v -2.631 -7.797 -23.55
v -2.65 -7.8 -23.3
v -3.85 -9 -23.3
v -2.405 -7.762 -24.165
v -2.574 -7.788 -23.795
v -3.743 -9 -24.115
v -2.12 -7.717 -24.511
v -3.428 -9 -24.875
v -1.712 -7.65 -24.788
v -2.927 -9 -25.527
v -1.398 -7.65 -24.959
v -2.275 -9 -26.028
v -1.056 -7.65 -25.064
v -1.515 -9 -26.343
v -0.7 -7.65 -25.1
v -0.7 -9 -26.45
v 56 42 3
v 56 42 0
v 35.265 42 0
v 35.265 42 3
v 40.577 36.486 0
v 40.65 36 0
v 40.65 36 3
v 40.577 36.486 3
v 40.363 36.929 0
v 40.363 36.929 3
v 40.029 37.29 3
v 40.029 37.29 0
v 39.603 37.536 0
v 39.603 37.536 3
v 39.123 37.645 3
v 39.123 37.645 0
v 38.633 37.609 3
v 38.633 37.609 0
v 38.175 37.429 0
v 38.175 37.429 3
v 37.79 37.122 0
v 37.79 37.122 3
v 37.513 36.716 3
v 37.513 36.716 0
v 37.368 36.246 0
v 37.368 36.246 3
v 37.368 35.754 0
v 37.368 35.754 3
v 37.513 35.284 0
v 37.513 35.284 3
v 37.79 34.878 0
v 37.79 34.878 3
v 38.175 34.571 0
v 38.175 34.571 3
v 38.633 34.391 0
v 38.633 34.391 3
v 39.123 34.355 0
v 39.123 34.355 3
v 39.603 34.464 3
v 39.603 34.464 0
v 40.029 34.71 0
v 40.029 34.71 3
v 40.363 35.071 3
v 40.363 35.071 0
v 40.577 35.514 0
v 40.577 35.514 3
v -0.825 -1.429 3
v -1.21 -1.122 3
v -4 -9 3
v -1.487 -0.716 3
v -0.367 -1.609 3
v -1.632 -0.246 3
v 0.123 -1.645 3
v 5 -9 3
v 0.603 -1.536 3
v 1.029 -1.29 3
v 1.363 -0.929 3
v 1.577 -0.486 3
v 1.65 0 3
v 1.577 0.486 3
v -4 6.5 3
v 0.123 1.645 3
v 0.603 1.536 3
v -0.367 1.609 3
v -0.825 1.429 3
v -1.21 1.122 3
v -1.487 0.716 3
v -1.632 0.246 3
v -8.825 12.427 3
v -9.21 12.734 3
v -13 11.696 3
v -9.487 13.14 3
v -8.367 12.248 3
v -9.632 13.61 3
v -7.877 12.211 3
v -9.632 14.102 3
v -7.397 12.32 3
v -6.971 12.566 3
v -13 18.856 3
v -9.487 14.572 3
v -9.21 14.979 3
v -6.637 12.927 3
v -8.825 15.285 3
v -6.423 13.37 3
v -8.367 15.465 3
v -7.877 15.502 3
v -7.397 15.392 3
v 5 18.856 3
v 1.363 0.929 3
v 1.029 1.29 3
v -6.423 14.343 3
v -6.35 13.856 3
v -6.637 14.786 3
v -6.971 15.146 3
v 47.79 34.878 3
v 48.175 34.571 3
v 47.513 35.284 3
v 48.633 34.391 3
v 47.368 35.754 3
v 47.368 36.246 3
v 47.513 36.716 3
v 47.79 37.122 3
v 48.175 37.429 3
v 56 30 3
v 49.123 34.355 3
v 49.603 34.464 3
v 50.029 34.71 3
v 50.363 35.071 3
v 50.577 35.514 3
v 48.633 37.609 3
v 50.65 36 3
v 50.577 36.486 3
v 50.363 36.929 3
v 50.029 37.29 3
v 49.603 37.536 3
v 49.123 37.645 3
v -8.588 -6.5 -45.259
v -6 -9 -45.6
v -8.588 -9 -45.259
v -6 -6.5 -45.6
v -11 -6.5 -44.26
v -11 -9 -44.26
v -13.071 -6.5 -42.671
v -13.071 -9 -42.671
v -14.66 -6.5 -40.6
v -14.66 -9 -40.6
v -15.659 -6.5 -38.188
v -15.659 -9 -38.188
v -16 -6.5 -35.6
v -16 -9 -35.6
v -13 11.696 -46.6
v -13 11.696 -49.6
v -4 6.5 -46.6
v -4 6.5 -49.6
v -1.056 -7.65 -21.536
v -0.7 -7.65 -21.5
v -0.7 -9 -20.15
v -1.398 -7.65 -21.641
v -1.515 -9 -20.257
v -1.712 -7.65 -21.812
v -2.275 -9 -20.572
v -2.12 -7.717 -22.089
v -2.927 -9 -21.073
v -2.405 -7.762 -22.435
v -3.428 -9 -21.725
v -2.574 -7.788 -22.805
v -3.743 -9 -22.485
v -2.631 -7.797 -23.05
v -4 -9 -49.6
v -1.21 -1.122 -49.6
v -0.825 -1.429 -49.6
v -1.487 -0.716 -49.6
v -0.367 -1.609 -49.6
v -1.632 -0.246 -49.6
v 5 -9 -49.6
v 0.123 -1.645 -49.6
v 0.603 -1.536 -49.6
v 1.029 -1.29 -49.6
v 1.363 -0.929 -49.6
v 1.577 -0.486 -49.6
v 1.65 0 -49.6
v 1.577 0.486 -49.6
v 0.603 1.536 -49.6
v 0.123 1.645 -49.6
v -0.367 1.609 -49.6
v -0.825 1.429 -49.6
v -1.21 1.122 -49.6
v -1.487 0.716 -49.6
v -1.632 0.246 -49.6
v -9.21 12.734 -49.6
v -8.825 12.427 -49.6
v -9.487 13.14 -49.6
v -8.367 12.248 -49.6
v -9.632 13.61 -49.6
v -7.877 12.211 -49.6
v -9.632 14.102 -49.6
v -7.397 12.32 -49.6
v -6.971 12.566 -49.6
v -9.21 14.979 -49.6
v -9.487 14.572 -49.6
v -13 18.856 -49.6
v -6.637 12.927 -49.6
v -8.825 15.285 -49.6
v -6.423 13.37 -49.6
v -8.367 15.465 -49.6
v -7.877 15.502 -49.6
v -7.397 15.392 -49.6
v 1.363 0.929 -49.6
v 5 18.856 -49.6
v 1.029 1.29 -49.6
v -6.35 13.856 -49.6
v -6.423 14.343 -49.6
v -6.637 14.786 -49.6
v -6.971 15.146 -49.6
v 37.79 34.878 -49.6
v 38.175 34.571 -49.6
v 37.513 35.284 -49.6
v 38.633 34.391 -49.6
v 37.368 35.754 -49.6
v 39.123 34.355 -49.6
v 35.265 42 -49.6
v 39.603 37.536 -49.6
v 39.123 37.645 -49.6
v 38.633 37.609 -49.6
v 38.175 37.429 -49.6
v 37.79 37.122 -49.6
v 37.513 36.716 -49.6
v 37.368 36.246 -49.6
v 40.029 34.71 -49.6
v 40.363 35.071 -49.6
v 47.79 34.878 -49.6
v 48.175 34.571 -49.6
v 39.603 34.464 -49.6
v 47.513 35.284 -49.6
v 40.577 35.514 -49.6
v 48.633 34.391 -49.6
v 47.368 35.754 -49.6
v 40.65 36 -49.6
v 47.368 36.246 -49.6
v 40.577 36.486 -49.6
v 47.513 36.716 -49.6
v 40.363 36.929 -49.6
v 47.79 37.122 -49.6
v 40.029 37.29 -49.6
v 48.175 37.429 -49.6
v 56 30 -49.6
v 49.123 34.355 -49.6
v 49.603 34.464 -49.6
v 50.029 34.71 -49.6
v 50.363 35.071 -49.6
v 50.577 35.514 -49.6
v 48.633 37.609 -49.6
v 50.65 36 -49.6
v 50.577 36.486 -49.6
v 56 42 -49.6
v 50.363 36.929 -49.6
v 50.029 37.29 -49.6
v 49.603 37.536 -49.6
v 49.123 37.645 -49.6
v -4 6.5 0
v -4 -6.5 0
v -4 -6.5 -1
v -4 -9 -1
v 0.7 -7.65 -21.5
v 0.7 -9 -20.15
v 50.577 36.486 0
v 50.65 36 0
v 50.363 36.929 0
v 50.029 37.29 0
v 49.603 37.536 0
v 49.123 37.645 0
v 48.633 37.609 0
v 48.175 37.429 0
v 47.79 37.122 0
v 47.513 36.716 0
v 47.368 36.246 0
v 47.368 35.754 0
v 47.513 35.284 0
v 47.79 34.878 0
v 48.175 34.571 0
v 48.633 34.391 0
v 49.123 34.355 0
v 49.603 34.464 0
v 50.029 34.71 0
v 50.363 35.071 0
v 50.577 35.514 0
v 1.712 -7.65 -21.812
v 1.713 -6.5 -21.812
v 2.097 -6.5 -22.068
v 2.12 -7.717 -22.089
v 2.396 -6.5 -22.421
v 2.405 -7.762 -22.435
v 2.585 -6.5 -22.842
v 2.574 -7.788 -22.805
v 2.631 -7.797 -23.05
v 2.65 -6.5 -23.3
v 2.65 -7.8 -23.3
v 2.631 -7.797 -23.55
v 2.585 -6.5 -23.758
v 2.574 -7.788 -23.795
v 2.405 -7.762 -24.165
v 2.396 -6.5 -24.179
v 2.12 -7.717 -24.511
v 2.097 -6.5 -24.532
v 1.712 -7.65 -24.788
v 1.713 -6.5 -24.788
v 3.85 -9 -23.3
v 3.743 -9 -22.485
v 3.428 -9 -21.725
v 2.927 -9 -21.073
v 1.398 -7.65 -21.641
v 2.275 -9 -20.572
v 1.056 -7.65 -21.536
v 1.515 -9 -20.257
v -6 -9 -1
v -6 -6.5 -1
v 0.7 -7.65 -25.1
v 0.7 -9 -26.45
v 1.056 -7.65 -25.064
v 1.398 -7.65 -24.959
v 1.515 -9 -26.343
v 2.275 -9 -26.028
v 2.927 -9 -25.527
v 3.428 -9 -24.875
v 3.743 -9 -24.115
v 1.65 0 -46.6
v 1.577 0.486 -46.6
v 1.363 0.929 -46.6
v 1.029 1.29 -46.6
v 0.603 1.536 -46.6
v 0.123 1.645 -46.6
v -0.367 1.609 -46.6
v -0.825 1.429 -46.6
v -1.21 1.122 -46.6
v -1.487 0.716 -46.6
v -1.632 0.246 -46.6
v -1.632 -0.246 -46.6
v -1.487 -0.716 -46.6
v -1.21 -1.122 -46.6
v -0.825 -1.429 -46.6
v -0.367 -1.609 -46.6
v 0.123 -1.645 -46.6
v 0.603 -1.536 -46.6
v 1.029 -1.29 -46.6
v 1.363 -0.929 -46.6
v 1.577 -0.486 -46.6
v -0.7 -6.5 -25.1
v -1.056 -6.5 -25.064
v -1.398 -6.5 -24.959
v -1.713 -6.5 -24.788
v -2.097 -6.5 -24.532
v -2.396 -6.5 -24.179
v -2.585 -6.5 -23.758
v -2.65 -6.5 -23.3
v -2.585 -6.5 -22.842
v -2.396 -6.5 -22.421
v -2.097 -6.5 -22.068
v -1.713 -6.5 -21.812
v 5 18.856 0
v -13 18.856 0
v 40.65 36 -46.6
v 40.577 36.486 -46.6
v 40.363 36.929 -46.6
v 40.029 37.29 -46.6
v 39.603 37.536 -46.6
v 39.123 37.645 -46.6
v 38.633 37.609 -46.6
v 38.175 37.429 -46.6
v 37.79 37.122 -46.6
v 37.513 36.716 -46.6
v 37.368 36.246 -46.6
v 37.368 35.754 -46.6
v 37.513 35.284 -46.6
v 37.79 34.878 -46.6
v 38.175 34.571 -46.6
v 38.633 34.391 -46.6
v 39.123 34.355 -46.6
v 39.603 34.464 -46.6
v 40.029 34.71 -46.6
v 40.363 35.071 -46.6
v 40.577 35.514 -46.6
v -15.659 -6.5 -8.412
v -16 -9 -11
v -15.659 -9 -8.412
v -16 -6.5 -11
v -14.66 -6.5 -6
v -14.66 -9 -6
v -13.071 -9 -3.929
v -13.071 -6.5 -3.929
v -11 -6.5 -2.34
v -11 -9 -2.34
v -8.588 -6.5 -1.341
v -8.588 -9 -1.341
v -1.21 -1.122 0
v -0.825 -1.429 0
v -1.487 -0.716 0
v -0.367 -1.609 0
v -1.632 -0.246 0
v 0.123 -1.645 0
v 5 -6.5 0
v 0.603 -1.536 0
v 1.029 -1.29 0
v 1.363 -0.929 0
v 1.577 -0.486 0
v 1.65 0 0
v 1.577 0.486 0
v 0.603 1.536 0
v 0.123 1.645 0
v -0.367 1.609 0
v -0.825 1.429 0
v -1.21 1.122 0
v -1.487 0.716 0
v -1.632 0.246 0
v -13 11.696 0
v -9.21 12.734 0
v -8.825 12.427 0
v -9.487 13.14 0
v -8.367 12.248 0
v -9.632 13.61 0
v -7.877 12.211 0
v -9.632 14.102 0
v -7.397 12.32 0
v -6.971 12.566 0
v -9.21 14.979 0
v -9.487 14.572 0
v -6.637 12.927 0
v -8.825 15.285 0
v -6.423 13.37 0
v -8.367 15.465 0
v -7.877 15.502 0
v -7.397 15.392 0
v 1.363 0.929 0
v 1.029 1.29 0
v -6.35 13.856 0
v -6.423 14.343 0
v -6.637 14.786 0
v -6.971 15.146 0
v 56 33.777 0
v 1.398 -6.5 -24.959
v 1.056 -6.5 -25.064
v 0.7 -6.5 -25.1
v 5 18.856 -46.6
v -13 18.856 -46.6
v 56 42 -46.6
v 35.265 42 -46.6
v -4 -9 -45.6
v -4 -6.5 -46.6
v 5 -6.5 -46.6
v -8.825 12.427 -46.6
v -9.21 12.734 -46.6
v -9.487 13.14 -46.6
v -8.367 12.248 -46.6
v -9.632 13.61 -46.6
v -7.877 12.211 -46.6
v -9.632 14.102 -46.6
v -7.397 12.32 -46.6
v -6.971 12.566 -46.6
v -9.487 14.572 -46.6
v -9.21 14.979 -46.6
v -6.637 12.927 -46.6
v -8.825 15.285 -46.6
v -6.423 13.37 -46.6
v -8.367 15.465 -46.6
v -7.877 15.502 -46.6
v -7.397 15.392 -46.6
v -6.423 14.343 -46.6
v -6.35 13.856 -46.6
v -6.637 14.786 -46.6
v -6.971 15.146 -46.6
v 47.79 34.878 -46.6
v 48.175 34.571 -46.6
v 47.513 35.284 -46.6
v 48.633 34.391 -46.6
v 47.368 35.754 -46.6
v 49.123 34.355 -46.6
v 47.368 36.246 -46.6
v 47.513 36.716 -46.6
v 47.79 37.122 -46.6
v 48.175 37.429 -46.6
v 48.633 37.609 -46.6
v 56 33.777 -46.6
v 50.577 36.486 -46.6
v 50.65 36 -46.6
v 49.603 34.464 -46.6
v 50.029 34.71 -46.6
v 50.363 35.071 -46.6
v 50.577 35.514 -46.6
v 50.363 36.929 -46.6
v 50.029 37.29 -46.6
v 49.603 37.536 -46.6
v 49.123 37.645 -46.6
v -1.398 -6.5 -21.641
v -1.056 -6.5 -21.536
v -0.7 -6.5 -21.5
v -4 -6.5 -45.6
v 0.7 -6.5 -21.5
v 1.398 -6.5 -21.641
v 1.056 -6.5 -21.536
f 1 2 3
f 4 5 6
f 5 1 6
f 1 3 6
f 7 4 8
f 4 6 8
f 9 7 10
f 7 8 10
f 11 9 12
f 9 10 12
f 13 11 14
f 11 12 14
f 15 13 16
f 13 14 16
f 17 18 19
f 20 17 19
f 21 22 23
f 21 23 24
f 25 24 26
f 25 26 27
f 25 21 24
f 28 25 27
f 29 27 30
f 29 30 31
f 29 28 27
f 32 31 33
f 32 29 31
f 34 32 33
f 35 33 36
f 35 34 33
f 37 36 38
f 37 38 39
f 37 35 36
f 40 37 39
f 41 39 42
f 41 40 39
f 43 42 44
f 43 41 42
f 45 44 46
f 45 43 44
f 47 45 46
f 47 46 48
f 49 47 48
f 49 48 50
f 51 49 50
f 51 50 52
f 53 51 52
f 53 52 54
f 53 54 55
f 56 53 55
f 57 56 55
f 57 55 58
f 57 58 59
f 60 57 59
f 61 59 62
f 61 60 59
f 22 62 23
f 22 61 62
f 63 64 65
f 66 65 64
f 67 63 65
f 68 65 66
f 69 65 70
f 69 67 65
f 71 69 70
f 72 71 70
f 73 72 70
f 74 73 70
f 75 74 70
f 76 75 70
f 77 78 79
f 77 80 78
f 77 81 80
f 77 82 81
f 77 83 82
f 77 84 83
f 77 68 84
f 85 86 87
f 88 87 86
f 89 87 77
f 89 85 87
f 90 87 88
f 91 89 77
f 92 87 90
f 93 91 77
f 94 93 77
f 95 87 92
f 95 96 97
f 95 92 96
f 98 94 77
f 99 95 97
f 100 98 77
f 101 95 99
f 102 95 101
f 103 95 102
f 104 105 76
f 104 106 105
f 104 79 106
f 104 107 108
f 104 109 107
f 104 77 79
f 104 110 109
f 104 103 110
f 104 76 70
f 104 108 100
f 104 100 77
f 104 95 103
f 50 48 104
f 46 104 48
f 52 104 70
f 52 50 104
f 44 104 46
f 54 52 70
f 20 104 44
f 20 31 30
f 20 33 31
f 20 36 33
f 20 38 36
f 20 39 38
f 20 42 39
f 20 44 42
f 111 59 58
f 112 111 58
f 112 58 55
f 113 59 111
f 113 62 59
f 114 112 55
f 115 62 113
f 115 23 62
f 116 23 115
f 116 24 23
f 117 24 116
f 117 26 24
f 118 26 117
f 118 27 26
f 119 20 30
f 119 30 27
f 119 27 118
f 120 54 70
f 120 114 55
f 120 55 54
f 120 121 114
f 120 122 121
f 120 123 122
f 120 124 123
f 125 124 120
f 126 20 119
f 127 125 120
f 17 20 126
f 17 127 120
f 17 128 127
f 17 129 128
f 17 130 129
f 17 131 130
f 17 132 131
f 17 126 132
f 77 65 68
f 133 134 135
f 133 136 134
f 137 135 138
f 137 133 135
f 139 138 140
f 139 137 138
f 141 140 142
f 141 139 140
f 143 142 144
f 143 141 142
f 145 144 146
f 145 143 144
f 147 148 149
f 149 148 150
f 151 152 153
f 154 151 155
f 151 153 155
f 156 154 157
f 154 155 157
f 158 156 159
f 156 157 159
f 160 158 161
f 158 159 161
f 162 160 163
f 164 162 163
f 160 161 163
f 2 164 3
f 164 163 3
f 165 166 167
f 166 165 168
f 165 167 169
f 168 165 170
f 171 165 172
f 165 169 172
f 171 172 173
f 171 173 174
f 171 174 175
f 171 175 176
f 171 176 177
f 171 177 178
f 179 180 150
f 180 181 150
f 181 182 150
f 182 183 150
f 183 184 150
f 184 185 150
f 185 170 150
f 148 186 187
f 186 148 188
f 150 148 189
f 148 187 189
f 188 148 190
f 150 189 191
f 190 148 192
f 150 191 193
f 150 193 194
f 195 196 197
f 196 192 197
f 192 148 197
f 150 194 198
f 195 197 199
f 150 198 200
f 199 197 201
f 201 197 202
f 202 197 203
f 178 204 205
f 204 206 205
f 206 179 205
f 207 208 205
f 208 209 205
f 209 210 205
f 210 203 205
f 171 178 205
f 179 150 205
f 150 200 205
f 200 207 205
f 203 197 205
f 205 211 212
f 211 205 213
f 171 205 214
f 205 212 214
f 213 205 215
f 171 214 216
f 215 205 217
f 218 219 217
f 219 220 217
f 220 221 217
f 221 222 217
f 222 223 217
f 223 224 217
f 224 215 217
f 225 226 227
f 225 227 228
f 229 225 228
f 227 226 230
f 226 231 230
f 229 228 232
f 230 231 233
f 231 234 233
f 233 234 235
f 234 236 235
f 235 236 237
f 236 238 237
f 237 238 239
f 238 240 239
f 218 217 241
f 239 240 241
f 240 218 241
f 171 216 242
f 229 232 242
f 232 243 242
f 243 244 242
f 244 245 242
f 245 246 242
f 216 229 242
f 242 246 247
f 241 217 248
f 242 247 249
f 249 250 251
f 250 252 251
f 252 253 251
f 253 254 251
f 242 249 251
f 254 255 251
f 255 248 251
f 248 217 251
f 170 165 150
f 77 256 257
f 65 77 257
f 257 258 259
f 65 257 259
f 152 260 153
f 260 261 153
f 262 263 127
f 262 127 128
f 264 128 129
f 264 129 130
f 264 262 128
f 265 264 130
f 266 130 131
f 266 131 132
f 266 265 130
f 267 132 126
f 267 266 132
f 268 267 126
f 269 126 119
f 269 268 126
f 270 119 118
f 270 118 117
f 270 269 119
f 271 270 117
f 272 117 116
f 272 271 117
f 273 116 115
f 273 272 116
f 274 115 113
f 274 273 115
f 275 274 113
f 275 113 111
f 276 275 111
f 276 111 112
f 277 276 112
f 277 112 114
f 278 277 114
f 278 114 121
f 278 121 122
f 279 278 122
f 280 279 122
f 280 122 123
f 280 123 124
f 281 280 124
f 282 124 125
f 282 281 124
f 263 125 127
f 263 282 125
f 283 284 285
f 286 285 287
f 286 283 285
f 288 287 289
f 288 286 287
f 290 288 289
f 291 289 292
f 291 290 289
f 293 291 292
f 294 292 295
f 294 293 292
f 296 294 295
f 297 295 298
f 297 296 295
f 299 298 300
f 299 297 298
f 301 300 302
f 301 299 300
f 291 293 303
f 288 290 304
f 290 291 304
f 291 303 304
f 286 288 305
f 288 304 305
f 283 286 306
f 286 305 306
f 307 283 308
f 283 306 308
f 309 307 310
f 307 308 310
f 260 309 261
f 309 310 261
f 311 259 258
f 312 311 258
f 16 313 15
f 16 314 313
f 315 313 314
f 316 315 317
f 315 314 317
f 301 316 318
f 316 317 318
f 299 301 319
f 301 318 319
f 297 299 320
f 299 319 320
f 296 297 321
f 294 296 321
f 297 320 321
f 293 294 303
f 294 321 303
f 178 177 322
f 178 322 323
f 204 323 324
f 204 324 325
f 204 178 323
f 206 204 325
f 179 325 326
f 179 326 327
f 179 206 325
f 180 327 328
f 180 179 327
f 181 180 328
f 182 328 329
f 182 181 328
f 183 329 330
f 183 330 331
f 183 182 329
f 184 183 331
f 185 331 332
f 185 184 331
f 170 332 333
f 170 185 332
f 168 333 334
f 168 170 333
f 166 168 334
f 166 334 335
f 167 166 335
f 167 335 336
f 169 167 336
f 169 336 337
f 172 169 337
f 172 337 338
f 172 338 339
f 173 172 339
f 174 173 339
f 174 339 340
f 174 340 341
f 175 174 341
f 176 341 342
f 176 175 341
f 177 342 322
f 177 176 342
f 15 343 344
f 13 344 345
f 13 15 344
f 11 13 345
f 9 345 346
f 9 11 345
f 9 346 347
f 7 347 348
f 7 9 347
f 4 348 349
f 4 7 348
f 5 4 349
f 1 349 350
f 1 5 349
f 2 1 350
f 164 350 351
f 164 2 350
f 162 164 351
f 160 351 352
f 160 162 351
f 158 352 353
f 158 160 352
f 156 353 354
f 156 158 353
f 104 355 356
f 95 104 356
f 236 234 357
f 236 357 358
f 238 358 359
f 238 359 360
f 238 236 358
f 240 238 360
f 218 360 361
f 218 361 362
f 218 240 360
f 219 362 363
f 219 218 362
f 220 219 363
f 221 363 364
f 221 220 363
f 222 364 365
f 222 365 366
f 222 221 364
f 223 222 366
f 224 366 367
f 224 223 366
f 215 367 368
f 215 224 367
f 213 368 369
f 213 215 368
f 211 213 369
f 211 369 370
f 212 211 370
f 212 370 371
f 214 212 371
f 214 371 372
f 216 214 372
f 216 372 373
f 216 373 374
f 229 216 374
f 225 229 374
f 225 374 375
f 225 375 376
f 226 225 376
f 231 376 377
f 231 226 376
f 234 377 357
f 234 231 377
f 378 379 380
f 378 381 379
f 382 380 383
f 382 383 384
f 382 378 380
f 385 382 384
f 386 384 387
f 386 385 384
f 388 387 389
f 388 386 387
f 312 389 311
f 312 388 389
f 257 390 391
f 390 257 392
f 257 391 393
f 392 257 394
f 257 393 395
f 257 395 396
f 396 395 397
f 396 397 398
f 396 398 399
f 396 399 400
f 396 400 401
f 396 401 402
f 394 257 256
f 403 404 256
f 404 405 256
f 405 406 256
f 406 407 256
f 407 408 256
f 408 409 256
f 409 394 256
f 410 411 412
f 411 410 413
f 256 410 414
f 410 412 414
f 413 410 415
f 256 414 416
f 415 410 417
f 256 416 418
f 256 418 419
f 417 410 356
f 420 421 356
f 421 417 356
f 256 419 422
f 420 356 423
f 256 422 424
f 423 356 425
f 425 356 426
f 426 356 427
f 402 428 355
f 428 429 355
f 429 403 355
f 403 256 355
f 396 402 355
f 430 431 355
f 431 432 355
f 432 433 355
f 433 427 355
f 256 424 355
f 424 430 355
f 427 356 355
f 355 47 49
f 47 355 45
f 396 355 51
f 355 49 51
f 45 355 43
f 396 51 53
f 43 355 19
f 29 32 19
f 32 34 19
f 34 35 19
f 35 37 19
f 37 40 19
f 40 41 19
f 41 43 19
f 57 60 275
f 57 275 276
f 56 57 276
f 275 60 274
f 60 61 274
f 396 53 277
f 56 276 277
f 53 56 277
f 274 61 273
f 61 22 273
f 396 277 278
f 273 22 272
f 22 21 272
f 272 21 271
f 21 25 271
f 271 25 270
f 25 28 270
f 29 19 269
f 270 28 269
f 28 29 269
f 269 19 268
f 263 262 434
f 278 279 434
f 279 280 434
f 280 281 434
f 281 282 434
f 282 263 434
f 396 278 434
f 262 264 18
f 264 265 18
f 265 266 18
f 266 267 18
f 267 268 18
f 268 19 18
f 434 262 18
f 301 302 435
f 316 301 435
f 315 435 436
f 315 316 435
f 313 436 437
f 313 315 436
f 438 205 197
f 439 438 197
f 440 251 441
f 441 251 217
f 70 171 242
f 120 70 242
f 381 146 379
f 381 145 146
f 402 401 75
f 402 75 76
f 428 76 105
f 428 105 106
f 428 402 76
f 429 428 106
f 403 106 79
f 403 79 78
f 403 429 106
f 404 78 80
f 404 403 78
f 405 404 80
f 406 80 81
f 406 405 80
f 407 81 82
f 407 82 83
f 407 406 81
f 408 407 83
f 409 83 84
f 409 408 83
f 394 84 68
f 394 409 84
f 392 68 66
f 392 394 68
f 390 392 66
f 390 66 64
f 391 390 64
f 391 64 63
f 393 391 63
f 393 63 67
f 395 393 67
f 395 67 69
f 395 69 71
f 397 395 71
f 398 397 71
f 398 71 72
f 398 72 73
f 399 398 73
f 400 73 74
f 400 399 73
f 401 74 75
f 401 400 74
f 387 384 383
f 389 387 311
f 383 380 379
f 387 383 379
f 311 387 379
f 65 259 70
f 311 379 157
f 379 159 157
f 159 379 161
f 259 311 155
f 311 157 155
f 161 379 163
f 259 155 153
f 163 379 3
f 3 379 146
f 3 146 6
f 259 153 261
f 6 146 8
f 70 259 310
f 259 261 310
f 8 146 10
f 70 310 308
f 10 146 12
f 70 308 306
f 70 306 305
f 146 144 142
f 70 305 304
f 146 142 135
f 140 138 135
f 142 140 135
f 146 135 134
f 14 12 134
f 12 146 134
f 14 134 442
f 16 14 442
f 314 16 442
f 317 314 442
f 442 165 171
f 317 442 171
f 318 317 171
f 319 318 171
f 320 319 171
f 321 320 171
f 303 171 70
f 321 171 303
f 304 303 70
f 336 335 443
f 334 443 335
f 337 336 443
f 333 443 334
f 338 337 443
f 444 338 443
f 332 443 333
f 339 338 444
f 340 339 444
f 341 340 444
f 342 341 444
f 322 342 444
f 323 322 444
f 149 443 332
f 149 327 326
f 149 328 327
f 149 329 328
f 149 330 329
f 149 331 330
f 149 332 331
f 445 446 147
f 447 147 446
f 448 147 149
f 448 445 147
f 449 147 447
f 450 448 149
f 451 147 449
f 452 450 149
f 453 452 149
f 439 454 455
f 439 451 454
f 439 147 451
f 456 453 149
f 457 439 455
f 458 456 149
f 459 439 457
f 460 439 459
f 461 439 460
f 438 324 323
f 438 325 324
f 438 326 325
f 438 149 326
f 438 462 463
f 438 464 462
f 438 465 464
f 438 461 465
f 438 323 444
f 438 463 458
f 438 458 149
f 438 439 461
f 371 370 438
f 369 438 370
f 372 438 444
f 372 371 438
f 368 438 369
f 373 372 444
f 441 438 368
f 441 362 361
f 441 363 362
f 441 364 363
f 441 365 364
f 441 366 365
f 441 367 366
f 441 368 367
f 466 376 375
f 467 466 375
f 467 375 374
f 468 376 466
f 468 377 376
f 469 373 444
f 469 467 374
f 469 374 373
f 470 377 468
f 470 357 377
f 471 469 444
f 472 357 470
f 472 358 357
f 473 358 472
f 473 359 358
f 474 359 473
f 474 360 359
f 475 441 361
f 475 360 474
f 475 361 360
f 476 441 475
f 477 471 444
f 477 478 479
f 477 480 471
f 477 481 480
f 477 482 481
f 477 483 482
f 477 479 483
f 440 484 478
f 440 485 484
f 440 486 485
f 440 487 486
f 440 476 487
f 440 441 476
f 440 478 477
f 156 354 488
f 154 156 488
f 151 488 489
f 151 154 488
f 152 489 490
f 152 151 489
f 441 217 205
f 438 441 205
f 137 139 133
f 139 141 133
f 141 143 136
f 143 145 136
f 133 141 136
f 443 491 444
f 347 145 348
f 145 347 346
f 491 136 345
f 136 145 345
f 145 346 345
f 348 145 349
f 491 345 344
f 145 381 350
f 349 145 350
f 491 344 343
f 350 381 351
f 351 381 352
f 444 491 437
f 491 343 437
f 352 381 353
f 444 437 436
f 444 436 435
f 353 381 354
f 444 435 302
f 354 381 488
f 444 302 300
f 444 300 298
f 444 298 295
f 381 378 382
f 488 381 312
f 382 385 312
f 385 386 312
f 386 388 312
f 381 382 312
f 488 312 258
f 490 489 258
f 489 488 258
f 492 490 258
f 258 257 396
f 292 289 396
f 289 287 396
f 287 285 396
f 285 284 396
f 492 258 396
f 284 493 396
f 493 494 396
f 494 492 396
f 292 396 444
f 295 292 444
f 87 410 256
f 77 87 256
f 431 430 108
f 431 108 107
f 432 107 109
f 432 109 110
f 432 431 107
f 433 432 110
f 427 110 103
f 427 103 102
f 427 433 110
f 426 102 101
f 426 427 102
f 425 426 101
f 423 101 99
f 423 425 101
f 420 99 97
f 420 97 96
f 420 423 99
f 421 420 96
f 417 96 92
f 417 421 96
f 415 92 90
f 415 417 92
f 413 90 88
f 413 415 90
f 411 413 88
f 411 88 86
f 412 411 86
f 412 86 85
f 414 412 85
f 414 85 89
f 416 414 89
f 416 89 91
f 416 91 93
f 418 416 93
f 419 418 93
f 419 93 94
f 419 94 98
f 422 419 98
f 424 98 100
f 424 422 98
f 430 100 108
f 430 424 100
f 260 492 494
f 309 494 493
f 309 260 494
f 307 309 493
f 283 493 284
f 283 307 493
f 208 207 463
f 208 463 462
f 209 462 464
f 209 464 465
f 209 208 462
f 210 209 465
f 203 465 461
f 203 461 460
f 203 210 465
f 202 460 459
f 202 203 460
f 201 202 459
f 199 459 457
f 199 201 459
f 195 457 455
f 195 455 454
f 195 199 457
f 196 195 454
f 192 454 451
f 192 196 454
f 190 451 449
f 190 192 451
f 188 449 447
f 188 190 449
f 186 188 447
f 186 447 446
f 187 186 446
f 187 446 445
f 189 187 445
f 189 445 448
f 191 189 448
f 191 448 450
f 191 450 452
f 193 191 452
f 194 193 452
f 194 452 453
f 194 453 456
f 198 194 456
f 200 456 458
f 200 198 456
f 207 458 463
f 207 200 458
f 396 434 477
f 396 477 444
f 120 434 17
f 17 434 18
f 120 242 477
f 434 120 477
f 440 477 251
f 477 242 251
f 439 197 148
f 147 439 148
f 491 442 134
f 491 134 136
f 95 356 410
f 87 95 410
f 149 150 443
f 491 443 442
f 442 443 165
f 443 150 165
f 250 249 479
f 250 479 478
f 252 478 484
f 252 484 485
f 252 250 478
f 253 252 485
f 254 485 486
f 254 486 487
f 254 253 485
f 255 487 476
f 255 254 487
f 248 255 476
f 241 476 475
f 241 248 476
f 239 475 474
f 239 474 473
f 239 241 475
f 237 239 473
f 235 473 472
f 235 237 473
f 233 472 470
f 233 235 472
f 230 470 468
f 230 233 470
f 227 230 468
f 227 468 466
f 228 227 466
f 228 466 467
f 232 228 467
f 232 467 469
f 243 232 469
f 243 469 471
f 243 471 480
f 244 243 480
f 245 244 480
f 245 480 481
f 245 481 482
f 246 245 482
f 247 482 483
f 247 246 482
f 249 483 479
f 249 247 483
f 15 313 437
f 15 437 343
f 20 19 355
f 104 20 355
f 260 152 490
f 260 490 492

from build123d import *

# Parameters (mm, degrees)
SKETCH1_R                                      = 1.65
BOSS_EXTRUDE1_DEPTH                            = 3
SKETCH1_3_W                                    = 9
SKETCH1_3_H                                    = 2.5
BOSS_EXTRUDE2_DEPTH                            = 46.6
BOSS_EXTRUDE3_START                            = -49.6
SKETCH1_4_R                                    = 1.65
SKETCH1_4_W                                    = 9
SKETCH1_4_H                                    = 2.5
BOSS_EXTRUDE3_DEPTH                            = 3
CUT_EXTRUDE1_DEPTH                             = 88.5
SKETCH3_W                                      = 44.6
SKETCH3_H                                      = 2.5
BOSS_EXTRUDE4_DEPTH                            = 12
FILLET1_R                                      = 10
CSK_START                                      = -9
CSK_SLOT_FOR_M3_COUNTERSUNK_FLAT_HEAD_SC_DEPTH = 3


with BuildPart() as part:
    # Sketch1 → Boss-Extrude1 (new body)
    with BuildSketch(Plane.XY):
        Polygon((-13, 18.856406461), (-13, 11.696152423), (-4, 6.5), (-4, -9), (5, -9), (56, 30), (56, 42), (35.264699244, 42), (5, 18.856406461), align=None)
        Circle(SKETCH1_R, mode=Mode.SUBTRACT)
        with Locations((-8, 13.856406461)):
            Circle(SKETCH1_R, mode=Mode.SUBTRACT)
        with Locations((49, 36)):
            Circle(SKETCH1_R, mode=Mode.SUBTRACT)
        with Locations((39, 36)):
            Circle(SKETCH1_R, mode=Mode.SUBTRACT)
    extrude(amount=BOSS_EXTRUDE1_DEPTH)

    # Sketch1<3> → Boss-Extrude2 (add)
    with BuildSketch(Plane.XY):
        with Locations((0.5, -7.75)):
            Rectangle(SKETCH1_3_W, SKETCH1_3_H)
        Polygon((56, 33.77663551), (5, -6.5), (5, -9), (56, 30), align=None)
    extrude(amount=-BOSS_EXTRUDE2_DEPTH)

    # Sketch1<4> → Boss-Extrude3 (add)
    # profile 1 of 4: a face of its own
    with BuildSketch(Plane.XY.offset(BOSS_EXTRUDE3_START)):
        Polygon((5, 18.856406461), (-13, 18.856406461), (-13, 11.696152423), (-4, 6.5), (-4, -6.5), (5, -6.5), align=None)
        Circle(SKETCH1_4_R, mode=Mode.SUBTRACT)
        with Locations((-8, 13.856406461)):
            Circle(SKETCH1_4_R, mode=Mode.SUBTRACT)
    # profile 2 of 4: a face of its own
    with BuildSketch(Plane.XY.offset(BOSS_EXTRUDE3_START)):
        with Locations((0.5, -7.75)):
            Rectangle(SKETCH1_4_W, SKETCH1_4_H)
    # profile 3 of 4: a face of its own
    with BuildSketch(Plane.XY.offset(BOSS_EXTRUDE3_START)):
        Polygon((56, 33.77663551), (5, -6.5), (5, -9), (56, 30), align=None)
    # profile 4 of 4: a face of its own
    with BuildSketch(Plane.XY.offset(BOSS_EXTRUDE3_START)):
        Polygon((35.264699244, 42), (5, 18.856406461), (5, -6.5), (56, 33.77663551), (56, 42), align=None)
        with Locations((39, 36)):
            Circle(SKETCH1_4_R, mode=Mode.SUBTRACT)
        with Locations((49, 36)):
            Circle(SKETCH1_4_R, mode=Mode.SUBTRACT)
    extrude(amount=BOSS_EXTRUDE3_DEPTH)

    # Sketch2 → Cut-Extrude1 (cut)
    with BuildSketch(Plane.XZ.offset(9)):
        with BuildLine():
            Line((1, -24.95), (-1, -24.95))
            ThreePointArc((-1, -24.95), (-2.65, -23.3), (-1, -21.65))
            Line((-1, -21.65), (1, -21.65))
            ThreePointArc((1, -21.65), (2.65, -23.3), (1, -24.95))
        make_face()
    extrude(amount=-CUT_EXTRUDE1_DEPTH, mode=Mode.SUBTRACT)

    # Sketch3 → Boss-Extrude4 (add)
    with BuildSketch(Plane.ZY.offset(4)):
        with Locations((-23.3, -7.75)):
            Rectangle(SKETCH3_W, SKETCH3_H)
    extrude(amount=BOSS_EXTRUDE4_DEPTH)

    # Fillet1
    fillet1_edges = [part.edges().sort_by_distance(p)[0] for p in [
        (-16, -7.75, -45.6),
        (-16, -7.75, -1),
    ]]
    fillet(fillet1_edges, radius=FILLET1_R)

    # CSK SLOT for M3 Countersunk Flat Head Screw1: read off the stored shape, not the designer's step
    # CSK SLOT for M3 Countersunk Flat Hea 2 → CSK SLOT for M3 Countersunk Flat Head Screw1 (cut)
    with BuildSketch(Plane(origin=(0, 0, 0), x_dir=(1, 0, 0), z_dir=(0, 1, 0)).offset(CSK_START)):
        with BuildLine():
            ThreePointArc((1.7125, 24.788235112), (1.229705955, 25.020294045), (0.7, 25.1))
            Line((0.7, 25.1), (-0.7, 25.1))
            ThreePointArc((-0.7, 25.1), (-1.229705955, 25.020294045), (-1.7125, 24.788235112))
            ThreePointArc((-1.7125, 24.788235112), (-1.365316345, 24.909050642), (-1, 24.95))
            Line((-1, 24.95), (1, 24.95))
            ThreePointArc((1, 24.95), (1.365316345, 24.909050642), (1.7125, 24.788235112))
        make_face()
        with BuildLine():
            ThreePointArc((0.7, 21.5), (1.229705955, 21.579705955), (1.7125, 21.811764888))
            ThreePointArc((1.7125, 21.811764888), (1.365316345, 21.690949358), (1, 21.65))
            Line((1, 21.65), (-1, 21.65))
            ThreePointArc((-1, 21.65), (-1.365316345, 21.690949358), (-1.7125, 21.811764888))
            ThreePointArc((-1.7125, 21.811764888), (-1.229705955, 21.579705955), (-0.7, 21.5))
            Line((-0.7, 21.5), (0.7, 21.5))
        make_face()
    extrude(amount=CSK_SLOT_FOR_M3_COUNTERSUNK_FLAT_HEAD_SC_DEPTH, mode=Mode.SUBTRACT)

    # CSK SLOT for M3 Countersunk Flat Hea 3: loft between two sections, ruled curve by curve
    csk_slot_for_m3_countersunk_flat_hea_3_from = [
        Edge.make_three_point_arc((0.7, -7.649999999, -25.099999999), (1.972792205, -7.649999999, -24.572792205), (2.499999999, -7.649999999, -23.3)),
        Edge.make_three_point_arc((2.499999999, -7.649999999, -23.3), (1.972792205, -7.649999999, -22.027207795), (0.7, -7.649999999, -21.500000001)),
        Edge.make_three_point_arc((-0.7, -7.649999999, -21.500000001), (-1.972792205, -7.649999999, -22.027207795), (-2.499999999, -7.649999999, -23.3)),
        Edge.make_three_point_arc((-2.499999999, -7.649999999, -23.3), (-1.972792205, -7.649999999, -24.572792205), (-0.7, -7.649999999, -25.099999999)),
        Edge.make_line((0.7, -7.649999999, -21.500000001), (-0.7, -7.649999999, -21.500000001)),
        Edge.make_line((0.7, -7.649999999, -25.099999999), (-0.7, -7.649999999, -25.099999999)),
    ]
    csk_slot_for_m3_countersunk_flat_hea_3_to = [
        Edge.make_three_point_arc((0.7, -9, -26.45), (2.927386361, -9, -25.527386361), (3.85, -9, -23.3)),
        Edge.make_three_point_arc((3.85, -9, -23.3), (2.927386361, -9, -21.072613639), (0.7, -9, -20.15)),
        Edge.make_three_point_arc((-0.7, -9, -20.15), (-2.927386361, -9, -21.072613639), (-3.85, -9, -23.3)),
        Edge.make_three_point_arc((-3.85, -9, -23.3), (-2.927386361, -9, -25.527386361), (-0.7, -9, -26.45)),
        Edge.make_line((0.7, -9, -20.15), (-0.7, -9, -20.15)),
        Edge.make_line((0.7, -9, -26.45), (-0.7, -9, -26.45)),
    ]
    csk_slot_for_m3_countersunk_flat_hea_3 = Solid(Shell([*[Face.make_surface_from_curves(csk_slot_for_m3_countersunk_flat_hea_3_from[k], csk_slot_for_m3_countersunk_flat_hea_3_to[k]) for k in range(6)], Face(Wire(csk_slot_for_m3_countersunk_flat_hea_3_from)), Face(Wire(csk_slot_for_m3_countersunk_flat_hea_3_to))]))
    add(csk_slot_for_m3_countersunk_flat_hea_3, mode=Mode.SUBTRACT)


solid = part.part
